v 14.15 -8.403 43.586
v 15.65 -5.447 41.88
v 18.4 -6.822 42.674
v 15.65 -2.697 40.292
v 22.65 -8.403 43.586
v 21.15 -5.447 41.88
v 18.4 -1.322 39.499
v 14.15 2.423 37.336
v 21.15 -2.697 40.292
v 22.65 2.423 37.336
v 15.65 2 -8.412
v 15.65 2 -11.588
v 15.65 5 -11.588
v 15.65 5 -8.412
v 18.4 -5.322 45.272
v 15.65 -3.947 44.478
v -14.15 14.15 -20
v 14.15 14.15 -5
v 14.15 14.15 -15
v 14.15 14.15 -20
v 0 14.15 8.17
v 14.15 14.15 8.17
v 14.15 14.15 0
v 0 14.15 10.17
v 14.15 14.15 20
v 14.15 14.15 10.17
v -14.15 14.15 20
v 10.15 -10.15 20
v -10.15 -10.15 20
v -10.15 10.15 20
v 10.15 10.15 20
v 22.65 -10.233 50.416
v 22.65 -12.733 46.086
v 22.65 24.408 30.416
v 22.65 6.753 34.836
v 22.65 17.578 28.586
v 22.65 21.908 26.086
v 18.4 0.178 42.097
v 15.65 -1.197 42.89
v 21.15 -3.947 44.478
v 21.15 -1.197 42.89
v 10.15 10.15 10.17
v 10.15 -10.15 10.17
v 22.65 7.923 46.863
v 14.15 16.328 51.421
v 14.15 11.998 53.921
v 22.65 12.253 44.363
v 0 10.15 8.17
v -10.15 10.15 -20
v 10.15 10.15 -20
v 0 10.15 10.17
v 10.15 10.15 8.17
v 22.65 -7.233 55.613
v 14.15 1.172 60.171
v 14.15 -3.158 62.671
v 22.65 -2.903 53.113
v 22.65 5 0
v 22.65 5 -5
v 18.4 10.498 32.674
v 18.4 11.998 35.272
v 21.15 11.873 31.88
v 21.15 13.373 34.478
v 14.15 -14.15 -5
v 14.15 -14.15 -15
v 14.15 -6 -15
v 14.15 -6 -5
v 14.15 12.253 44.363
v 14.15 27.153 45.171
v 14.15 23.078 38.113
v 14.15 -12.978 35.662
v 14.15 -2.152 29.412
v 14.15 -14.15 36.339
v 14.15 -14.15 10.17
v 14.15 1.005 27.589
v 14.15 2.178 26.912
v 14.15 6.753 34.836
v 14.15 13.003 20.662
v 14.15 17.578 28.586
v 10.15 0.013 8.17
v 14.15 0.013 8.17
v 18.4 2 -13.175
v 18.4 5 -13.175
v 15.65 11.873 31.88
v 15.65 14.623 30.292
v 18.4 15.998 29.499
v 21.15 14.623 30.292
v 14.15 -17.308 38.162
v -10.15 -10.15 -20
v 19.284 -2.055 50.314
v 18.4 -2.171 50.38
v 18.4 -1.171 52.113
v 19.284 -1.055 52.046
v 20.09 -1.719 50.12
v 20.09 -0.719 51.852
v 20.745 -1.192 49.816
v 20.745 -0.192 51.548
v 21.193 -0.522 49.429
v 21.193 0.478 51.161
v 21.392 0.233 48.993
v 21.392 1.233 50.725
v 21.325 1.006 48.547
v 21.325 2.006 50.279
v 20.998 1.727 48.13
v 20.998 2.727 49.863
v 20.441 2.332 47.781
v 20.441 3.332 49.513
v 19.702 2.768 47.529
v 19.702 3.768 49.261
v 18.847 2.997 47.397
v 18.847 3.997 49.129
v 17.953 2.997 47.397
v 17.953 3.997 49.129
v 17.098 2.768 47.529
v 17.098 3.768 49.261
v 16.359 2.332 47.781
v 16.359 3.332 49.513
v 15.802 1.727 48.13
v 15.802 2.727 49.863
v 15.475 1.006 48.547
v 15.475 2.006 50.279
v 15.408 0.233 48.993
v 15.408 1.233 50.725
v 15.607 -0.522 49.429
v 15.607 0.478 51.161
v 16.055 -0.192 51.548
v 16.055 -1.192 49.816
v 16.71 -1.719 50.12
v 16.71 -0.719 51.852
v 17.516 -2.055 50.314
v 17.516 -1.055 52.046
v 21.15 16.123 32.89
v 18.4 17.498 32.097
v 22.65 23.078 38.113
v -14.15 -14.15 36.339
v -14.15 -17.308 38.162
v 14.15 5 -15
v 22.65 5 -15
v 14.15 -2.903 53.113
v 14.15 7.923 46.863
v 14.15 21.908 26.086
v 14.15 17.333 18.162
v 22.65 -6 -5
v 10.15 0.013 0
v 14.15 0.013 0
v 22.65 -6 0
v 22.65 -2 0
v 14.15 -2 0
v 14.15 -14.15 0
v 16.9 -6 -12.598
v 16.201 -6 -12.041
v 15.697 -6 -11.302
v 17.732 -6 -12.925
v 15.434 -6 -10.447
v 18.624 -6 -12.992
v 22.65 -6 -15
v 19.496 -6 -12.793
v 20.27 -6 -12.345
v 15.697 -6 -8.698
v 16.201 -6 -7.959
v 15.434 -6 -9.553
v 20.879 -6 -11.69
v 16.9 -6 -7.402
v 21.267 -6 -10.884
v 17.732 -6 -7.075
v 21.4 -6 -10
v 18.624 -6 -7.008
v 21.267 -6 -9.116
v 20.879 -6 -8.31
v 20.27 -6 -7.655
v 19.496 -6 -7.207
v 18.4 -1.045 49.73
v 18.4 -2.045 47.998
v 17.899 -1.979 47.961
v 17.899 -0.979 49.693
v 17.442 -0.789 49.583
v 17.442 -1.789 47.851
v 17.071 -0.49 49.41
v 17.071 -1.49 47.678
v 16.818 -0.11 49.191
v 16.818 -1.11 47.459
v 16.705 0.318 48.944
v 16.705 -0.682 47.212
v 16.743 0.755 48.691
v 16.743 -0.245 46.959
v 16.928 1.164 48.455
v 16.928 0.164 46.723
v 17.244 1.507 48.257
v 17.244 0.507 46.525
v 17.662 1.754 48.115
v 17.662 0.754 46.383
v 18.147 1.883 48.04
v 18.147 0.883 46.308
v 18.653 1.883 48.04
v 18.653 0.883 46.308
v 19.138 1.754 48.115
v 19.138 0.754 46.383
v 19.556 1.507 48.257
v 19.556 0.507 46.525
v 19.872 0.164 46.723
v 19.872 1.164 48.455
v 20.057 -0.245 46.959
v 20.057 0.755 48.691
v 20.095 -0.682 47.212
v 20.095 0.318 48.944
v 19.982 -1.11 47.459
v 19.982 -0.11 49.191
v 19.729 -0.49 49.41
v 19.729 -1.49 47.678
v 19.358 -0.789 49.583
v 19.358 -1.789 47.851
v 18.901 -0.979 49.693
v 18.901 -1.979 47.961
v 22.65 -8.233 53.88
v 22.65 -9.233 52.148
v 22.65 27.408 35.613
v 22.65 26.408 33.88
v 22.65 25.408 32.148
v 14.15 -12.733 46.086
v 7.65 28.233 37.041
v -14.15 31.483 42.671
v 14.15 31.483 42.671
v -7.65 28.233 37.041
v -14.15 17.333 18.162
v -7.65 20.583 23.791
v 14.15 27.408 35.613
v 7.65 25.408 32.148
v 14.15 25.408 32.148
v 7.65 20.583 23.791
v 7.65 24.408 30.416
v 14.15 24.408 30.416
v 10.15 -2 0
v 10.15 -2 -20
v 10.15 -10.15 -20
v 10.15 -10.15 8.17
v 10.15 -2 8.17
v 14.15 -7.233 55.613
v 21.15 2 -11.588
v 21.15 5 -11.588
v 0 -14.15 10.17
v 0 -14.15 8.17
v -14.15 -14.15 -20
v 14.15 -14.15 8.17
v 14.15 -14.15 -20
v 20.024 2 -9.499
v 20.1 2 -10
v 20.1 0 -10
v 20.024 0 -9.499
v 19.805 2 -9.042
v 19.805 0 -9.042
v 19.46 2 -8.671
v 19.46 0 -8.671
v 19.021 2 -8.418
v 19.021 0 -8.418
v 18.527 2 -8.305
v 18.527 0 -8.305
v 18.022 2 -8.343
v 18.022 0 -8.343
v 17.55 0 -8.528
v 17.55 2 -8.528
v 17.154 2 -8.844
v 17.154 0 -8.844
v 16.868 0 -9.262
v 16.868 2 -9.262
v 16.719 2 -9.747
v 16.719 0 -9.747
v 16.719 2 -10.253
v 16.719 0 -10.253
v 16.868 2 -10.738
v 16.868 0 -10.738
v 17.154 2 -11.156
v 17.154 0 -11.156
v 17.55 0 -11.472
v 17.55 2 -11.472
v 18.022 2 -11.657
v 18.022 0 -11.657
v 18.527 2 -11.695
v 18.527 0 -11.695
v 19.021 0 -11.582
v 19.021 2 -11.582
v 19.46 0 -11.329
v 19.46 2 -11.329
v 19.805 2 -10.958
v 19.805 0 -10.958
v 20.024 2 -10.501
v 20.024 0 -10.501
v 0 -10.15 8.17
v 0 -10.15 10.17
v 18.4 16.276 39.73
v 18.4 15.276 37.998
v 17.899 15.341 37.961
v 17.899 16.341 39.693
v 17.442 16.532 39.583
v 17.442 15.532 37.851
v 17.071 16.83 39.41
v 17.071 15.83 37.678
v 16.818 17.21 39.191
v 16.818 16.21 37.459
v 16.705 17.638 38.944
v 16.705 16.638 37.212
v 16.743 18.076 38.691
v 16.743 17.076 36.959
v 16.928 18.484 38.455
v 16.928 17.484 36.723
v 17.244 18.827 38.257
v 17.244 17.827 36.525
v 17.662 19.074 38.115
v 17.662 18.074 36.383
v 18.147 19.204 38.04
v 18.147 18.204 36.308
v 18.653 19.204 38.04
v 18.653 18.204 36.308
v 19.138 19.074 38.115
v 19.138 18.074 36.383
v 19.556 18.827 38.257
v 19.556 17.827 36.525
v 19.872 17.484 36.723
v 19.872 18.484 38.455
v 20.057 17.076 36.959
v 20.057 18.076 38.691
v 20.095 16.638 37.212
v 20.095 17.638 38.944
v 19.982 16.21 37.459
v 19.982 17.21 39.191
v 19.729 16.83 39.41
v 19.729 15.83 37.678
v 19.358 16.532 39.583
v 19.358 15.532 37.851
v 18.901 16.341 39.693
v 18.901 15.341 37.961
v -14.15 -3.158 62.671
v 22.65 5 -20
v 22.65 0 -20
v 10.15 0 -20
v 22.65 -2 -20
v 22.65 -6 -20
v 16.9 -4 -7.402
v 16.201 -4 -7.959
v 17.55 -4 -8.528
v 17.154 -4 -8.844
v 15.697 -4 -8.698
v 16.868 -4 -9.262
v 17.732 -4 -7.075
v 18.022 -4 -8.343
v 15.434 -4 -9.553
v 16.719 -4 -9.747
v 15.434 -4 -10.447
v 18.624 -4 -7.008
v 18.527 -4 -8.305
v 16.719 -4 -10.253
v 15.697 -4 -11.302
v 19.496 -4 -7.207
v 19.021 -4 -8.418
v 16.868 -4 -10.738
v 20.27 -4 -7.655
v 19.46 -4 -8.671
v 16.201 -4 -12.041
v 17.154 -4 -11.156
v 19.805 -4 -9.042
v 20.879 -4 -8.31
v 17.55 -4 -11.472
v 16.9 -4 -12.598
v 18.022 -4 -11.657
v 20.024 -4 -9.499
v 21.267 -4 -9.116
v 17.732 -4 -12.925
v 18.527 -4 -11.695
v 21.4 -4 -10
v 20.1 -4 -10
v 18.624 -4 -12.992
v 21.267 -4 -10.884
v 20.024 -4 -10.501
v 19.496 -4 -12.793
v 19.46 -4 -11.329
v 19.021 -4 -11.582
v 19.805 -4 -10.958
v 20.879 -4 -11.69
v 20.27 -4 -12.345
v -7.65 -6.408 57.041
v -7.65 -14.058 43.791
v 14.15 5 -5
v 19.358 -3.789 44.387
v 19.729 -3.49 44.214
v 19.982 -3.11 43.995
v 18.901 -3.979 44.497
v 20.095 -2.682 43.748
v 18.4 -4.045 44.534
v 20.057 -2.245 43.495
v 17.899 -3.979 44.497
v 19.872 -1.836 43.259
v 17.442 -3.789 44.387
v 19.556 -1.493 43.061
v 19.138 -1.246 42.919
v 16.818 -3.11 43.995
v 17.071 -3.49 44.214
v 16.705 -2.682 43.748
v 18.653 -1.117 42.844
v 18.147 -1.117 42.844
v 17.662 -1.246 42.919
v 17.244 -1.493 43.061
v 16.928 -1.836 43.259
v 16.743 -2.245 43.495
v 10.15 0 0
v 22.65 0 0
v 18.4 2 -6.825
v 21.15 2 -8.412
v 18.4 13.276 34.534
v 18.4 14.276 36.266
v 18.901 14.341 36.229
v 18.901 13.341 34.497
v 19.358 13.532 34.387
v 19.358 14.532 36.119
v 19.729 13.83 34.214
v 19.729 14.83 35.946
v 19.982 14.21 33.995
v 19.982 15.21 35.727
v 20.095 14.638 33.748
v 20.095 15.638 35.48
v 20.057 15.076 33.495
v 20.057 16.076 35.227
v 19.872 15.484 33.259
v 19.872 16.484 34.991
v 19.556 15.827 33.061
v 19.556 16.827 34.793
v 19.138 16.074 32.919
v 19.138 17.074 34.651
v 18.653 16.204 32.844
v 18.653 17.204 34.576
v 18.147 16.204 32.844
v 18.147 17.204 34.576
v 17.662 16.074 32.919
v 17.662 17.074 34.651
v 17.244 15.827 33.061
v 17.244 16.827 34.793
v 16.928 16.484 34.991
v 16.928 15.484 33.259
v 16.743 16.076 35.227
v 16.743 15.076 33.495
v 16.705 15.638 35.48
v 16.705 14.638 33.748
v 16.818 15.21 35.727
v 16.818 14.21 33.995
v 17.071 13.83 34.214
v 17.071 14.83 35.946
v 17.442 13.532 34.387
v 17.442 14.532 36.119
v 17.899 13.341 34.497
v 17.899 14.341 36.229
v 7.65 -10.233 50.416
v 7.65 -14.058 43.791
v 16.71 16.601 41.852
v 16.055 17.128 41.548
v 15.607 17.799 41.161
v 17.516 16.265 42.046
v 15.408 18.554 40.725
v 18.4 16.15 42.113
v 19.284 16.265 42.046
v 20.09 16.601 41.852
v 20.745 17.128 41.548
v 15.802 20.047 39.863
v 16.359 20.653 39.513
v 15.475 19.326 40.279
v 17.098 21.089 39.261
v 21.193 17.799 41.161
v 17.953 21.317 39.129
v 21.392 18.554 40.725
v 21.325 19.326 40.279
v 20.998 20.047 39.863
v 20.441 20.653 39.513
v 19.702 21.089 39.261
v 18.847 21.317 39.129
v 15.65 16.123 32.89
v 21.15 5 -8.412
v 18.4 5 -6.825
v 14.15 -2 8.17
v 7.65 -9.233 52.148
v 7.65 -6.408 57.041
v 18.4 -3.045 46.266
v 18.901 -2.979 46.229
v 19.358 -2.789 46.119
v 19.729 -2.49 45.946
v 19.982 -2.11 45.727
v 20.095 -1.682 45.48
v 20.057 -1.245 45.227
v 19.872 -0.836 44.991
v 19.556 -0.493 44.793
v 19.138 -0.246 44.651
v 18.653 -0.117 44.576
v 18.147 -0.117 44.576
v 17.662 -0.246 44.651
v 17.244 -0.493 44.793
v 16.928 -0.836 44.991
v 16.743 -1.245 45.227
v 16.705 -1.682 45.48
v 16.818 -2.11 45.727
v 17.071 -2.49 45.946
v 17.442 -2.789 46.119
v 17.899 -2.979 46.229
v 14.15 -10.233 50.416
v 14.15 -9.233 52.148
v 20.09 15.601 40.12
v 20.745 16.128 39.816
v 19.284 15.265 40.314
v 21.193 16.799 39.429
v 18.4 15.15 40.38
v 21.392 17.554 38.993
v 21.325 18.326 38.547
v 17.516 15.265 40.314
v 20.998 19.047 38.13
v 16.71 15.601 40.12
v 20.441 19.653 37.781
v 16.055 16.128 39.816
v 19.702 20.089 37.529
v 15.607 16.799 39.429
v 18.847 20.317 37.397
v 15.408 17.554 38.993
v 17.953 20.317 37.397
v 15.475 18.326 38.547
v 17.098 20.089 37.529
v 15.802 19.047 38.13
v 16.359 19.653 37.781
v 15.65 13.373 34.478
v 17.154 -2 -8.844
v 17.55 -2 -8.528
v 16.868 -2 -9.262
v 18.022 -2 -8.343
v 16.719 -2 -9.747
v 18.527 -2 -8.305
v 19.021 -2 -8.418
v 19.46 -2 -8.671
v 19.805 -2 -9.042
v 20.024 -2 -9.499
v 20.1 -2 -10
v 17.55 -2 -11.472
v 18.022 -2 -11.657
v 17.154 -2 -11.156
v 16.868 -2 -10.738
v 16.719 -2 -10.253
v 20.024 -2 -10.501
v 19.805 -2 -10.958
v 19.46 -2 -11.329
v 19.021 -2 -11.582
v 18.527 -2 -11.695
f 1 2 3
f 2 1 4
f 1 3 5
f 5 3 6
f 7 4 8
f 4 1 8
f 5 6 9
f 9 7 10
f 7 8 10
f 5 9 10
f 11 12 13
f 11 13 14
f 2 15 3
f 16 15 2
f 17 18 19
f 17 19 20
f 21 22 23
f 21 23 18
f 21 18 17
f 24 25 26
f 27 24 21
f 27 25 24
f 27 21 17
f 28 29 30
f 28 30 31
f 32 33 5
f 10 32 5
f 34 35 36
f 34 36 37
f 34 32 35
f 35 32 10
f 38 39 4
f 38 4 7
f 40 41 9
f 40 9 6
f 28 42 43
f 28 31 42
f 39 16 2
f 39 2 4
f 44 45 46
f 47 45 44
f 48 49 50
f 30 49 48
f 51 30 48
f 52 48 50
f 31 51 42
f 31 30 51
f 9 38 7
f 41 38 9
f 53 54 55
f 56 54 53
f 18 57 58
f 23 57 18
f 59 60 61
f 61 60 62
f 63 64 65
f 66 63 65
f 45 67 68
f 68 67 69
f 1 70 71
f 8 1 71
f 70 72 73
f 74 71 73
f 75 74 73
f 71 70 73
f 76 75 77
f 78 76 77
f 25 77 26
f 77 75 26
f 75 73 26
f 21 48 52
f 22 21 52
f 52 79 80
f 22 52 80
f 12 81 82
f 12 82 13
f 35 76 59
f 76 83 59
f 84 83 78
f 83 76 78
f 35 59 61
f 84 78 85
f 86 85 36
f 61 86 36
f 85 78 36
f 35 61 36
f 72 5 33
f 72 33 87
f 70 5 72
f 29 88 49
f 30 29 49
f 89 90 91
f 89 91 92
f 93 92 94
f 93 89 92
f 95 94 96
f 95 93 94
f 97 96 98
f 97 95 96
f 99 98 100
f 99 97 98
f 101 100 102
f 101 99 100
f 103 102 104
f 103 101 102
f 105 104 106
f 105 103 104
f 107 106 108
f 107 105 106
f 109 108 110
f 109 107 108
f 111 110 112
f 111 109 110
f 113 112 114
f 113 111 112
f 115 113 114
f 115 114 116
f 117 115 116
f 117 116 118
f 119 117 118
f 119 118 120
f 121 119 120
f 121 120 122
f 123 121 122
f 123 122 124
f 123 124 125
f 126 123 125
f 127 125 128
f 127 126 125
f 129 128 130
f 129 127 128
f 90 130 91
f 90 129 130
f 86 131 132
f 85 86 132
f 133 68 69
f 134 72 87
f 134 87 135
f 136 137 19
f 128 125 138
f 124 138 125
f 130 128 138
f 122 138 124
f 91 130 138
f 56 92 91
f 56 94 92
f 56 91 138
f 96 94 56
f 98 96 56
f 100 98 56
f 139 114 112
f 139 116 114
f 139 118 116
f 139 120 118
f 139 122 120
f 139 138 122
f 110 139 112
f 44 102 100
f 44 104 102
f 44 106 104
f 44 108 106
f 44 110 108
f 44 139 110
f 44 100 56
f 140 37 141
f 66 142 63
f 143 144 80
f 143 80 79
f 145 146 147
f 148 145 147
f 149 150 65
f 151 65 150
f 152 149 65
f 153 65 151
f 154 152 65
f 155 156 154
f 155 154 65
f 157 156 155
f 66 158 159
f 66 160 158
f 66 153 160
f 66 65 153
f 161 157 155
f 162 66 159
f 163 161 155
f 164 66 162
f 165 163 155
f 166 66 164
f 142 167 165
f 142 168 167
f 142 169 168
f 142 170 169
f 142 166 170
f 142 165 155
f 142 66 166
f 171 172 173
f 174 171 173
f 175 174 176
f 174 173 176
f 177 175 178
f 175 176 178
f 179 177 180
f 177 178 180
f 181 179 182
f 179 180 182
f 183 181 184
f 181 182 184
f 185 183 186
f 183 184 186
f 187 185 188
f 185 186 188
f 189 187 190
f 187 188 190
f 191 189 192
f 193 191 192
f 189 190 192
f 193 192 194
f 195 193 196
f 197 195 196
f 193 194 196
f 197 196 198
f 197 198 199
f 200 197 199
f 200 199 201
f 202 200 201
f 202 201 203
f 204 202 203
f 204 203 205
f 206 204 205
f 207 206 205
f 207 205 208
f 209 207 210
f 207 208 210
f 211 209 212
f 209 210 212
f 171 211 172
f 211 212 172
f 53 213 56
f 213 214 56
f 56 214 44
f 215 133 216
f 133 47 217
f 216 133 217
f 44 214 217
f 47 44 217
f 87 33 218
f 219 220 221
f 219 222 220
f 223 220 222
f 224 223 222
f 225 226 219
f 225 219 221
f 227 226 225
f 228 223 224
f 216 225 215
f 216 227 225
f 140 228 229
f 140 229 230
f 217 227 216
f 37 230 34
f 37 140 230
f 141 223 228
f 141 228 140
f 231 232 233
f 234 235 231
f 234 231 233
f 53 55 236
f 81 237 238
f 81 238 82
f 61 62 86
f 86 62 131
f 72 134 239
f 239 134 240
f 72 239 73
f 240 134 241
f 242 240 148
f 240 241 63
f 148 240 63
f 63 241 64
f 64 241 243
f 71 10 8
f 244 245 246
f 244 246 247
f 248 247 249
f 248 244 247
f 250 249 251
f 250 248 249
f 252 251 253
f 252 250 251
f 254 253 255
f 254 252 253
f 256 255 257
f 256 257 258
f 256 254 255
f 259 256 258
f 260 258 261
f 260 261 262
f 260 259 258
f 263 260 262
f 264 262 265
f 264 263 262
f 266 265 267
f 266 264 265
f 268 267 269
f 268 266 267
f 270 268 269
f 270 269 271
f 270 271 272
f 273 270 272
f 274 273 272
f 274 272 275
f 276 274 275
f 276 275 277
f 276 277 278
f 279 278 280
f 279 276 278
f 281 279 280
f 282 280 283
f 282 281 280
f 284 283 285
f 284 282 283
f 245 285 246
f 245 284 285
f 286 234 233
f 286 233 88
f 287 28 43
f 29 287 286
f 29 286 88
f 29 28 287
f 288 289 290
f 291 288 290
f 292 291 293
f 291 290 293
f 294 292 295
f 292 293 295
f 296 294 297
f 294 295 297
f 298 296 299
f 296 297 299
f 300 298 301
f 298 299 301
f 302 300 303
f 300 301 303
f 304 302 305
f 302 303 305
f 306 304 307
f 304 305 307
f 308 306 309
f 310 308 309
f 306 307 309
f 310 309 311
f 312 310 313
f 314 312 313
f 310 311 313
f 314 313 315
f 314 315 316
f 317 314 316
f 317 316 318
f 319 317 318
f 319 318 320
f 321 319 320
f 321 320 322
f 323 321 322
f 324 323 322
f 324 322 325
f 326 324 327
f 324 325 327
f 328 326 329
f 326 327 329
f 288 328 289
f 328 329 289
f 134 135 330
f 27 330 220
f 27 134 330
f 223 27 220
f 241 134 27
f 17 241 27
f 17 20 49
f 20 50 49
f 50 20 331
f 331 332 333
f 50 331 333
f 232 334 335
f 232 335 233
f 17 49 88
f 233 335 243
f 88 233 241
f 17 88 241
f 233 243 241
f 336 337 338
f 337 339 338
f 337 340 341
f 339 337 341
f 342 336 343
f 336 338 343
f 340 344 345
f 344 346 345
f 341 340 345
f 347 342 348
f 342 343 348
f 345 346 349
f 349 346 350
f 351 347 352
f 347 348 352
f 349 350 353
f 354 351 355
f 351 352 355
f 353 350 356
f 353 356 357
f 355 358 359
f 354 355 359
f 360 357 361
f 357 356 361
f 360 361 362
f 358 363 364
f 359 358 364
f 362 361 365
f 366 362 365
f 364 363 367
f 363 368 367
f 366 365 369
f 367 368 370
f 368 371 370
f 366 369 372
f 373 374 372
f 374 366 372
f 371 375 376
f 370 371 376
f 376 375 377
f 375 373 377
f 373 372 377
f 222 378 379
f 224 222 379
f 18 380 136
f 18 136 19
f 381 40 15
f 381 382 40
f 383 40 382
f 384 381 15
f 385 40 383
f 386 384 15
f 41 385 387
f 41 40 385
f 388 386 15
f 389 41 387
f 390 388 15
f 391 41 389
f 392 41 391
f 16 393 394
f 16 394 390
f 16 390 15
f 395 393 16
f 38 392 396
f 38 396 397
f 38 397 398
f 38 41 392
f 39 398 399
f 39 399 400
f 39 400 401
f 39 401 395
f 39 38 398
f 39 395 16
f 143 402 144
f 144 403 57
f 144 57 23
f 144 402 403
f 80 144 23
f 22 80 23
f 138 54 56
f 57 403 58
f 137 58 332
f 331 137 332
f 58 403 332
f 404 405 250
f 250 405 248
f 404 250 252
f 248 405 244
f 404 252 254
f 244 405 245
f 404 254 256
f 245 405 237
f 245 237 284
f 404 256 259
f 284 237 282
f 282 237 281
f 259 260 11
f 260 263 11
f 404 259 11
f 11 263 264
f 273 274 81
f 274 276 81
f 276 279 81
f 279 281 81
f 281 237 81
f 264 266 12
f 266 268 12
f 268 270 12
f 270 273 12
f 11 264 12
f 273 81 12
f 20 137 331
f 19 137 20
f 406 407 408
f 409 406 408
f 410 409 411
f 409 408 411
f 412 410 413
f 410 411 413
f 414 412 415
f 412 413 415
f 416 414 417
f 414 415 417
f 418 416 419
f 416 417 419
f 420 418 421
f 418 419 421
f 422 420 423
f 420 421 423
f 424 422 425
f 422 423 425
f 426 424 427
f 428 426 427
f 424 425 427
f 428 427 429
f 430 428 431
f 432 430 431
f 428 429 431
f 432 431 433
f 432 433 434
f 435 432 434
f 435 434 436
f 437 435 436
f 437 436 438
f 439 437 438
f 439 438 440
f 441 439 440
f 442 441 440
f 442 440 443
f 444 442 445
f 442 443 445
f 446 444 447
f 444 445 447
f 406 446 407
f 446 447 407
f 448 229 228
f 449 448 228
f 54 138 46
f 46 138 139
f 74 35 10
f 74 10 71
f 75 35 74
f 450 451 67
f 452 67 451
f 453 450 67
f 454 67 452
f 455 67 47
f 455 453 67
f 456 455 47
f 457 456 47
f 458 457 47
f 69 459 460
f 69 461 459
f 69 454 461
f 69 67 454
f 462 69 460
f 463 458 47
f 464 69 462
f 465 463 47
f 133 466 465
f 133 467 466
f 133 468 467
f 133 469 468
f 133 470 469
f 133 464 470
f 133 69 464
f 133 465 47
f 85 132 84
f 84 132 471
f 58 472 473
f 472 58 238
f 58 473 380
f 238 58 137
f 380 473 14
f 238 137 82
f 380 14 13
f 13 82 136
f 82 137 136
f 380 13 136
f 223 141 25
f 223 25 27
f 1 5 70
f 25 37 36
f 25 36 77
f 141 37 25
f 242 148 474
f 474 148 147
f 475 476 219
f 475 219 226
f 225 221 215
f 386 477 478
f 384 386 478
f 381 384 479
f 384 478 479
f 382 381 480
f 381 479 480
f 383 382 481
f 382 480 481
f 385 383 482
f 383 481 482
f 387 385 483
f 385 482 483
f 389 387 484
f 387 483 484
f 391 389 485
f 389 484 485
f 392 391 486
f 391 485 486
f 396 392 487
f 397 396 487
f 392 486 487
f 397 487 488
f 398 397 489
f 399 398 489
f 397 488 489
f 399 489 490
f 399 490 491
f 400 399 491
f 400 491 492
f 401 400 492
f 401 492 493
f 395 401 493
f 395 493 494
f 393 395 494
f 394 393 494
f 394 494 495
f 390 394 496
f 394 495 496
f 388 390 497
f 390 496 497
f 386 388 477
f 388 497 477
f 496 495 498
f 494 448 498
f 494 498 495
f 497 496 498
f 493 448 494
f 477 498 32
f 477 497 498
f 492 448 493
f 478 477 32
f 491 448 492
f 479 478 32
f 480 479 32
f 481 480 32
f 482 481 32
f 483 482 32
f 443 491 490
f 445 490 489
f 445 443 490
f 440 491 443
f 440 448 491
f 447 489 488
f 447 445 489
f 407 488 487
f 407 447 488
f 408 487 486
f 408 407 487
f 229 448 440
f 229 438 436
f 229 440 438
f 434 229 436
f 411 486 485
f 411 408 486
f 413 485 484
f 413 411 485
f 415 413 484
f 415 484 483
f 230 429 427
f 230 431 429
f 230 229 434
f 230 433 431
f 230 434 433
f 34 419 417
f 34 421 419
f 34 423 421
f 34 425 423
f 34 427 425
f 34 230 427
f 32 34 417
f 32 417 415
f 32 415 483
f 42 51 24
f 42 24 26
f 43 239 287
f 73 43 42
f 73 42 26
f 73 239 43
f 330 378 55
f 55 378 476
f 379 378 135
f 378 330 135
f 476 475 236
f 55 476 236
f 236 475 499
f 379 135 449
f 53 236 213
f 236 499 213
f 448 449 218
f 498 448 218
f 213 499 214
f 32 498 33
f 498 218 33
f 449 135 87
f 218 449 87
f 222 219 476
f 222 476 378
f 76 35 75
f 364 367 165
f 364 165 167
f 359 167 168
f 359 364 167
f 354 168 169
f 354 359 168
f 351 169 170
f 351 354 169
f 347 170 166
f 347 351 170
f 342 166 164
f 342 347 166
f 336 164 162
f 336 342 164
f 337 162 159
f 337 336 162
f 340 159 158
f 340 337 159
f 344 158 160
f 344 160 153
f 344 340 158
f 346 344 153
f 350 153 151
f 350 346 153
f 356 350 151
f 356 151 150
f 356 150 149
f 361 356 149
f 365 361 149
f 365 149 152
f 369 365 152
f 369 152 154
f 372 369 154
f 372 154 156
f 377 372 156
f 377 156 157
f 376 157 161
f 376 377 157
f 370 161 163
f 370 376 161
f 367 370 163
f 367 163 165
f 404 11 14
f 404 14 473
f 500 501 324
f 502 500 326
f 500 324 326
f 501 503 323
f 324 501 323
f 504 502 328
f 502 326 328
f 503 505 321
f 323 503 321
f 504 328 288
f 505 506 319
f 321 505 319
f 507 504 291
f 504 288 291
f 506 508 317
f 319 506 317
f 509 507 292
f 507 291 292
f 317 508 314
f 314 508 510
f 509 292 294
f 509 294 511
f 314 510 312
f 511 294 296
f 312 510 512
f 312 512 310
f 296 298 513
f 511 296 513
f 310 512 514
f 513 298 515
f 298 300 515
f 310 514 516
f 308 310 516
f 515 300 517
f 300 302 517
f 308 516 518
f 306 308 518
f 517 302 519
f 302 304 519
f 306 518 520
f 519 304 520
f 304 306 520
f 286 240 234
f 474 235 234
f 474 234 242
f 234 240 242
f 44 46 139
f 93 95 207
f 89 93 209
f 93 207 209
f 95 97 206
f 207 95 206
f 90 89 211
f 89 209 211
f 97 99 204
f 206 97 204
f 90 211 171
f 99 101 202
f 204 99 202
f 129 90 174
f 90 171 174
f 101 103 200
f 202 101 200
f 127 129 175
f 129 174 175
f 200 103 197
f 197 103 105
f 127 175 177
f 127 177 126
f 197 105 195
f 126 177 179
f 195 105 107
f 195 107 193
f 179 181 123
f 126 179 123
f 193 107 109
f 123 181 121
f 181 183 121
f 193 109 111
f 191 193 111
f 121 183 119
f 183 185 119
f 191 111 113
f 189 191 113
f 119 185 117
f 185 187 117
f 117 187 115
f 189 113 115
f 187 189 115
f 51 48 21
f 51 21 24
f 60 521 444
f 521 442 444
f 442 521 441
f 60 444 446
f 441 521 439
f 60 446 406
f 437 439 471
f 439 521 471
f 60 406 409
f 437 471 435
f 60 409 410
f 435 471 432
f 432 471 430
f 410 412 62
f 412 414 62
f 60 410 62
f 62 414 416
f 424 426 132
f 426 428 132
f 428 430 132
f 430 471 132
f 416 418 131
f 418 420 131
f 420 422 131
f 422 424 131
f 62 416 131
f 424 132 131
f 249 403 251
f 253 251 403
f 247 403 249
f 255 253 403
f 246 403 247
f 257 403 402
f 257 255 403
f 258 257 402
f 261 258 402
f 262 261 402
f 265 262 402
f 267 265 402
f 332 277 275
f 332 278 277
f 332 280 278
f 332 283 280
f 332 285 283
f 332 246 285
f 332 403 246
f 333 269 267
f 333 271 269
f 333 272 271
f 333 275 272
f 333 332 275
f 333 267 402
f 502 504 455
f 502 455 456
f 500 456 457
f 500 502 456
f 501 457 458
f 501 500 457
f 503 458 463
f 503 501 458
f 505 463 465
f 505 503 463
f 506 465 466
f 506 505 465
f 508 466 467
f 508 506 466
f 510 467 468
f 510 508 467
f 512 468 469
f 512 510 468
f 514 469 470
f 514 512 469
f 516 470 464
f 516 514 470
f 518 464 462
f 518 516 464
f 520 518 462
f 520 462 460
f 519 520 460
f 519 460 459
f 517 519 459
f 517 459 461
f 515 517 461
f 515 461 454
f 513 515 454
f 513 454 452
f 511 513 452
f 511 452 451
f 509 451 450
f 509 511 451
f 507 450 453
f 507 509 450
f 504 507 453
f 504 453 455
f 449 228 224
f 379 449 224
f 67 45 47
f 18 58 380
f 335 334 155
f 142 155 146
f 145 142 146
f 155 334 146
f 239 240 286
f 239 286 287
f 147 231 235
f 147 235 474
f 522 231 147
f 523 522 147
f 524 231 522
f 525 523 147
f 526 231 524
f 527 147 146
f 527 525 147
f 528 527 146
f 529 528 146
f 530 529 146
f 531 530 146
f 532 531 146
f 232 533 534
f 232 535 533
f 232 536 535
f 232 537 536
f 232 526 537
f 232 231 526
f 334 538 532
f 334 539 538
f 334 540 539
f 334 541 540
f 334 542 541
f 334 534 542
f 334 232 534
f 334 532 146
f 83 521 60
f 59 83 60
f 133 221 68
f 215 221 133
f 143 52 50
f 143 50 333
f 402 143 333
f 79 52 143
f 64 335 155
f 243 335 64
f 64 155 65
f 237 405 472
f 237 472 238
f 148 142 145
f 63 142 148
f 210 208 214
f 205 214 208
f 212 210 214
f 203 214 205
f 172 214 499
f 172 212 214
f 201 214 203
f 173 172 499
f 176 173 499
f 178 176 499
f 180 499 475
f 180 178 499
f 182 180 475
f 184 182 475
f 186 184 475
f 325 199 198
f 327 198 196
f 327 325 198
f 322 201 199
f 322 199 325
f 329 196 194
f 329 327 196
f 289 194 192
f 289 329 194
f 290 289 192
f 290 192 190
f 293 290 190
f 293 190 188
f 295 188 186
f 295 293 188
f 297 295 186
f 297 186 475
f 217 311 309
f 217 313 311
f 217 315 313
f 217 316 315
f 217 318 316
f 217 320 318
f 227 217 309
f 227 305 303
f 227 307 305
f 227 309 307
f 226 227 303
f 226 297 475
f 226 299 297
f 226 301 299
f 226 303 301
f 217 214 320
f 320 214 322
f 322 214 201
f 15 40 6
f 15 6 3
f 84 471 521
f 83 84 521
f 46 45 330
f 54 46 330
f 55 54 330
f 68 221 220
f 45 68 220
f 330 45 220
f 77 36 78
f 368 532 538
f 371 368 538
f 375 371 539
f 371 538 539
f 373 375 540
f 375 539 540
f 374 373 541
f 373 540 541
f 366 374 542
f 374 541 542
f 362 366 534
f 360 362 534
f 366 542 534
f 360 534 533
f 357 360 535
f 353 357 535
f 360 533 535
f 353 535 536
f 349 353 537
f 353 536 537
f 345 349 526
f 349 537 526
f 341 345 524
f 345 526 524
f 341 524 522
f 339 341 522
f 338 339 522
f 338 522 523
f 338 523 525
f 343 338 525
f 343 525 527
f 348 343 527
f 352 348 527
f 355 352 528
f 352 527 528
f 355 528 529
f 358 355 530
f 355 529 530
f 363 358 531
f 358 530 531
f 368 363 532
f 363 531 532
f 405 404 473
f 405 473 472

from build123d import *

# Parameters (mm, degrees)
ESQUISSE1_W                = 28.3
ESQUISSE1_H                = 28.3
ESQUISSE1_W_2              = 20.3
ESQUISSE1_H_2              = 20.3
ESQUISSE1_W_3              = 4
ESQUISSE1_H_3              = 2
BOSS_EXTRU_1_DEPTH         = 20
BOSS_EXTRU_7_DEPTH         = 20
ESQUISSE2_W                = 8.5
ESQUISSE2_H                = 20
ESQUISSE2_R                = 1.7
BOSS_EXTRU_2_DEPTH         = 2
ESQUISSE2_3_W              = 8.5
ESQUISSE2_3_H              = 20
BOSS_EXTRU_3_DEPTH         = 3
ESQUISSE3_W                = 8.5
ESQUISSE3_H                = 20
ESQUISSE3_R                = 1.7
BOSS_EXTRU_4_DEPTH         = 2
ESQUISSE5_W                = 8.5
ESQUISSE5_H                = 20
ESQUISSE5_R                = 3
BOSS_EXTRU_5_DEPTH         = 2
BOSS_EXTRU_6_DEPTH         = 20
BOSS_EXTRU_6_DEPTH_BACK    = 20
ESQUISSE6_W                = 28.3
ESQUISSE6_H                = 28.3
ESQUISSE6_W_2              = 15.3
ESQUISSE6_H_2              = 15.3
BOSS_EXTRU_12_REACH        = 59.663
ESQUISSE20_W               = 28.3
ESQUISSE20_H               = 28.3
ENL_V_MAT_EXTRU_1_REACH    = 81.469
ESQUISSE7_W                = 6.5
ESQUISSE7_H                = 2
ENL_V_MAT_EXTRU_2_REACH    = 82.765
ESQUISSE8_W                = 14.15
ESQUISSE8_H                = 2
ESQUISSE9_W                = 8.5
ESQUISSE9_H                = 40
BOSS_EXTRU_8_DEPTH         = 5
ESQUISSE9_4_R              = 1.7
BOSS_EXTRU_9_DEPTH         = 2
ESQUISSE10_W               = 8.5
ESQUISSE10_H               = 40
ESQUISSE10_R               = 1.7
BOSS_EXTRU_10_DEPTH        = 2
ESQUISSE11_W               = 8.5
ESQUISSE11_H               = 40
ESQUISSE11_R               = 3
BOSS_EXTRU_11_DEPTH        = 2
NERVURE4_REACH             = 81.469
ESQUISSE14_WALL_W          = 172.71321229
ESQUISSE14_WALL_H          = 5
NERVURE10_REACH            = 81.469
ESQUISSE16_WALL_W          = 173.426178518
ESQUISSE16_WALL_H          = 5
R_P_TITION_LIN_AIRE1_COUNT = 3
R_P_TITION_LIN_AIRE1_PITCH = 17.5
NERVURE11_REACH            = 93.316
ESQUISSE17_WALL_W          = 197.121376998
ESQUISSE17_WALL_H          = 5
NERVURE17_REACH            = 75.701
ESQUISSE19_WALL_W          = 161.177827304
ESQUISSE19_WALL_H          = 5
R_P_TITION_LIN_AIRE2_COUNT = 2
R_P_TITION_LIN_AIRE2_PITCH = 15
R_P_TITION_LIN_AIRE3_COUNT = 2
R_P_TITION_LIN_AIRE3_PITCH = 15
ENL_V_MAT_EXTRU_3_REACH    = 75.701
ESQUISSE21_W               = 4
ESQUISSE21_H               = 2.012776607


with BuildPart() as part:
    # Esquisse1 → Boss.-Extru.1 (new body)
    # profile 1 of 2: a face of its own
    with BuildSketch(Plane.XY):
        Rectangle(ESQUISSE1_W, ESQUISSE1_H)
        Rectangle(ESQUISSE1_W_2, ESQUISSE1_H_2, mode=Mode.SUBTRACT)
    # profile 2 of 2: a face of its own
    with BuildSketch(Plane.XY):
        with Locations((12.15, -1)):
            Rectangle(ESQUISSE1_W_3, ESQUISSE1_H_3)
    extrude(amount=BOSS_EXTRU_1_DEPTH)

    # Esquisse1<3> → Boss.-Extru.7 (add)
    with BuildSketch(Plane.XY):
        Polygon((14.15, 14.15), (-14.15, 14.15), (-14.15, -14.15), (14.15, -14.15), (14.15, -2), (10.15, -2), (10.15, -10.15), (-10.15, -10.15), (-10.15, 10.15), (10.15, 10.15), (10.15, 0), (14.15, 0), align=None)
    extrude(amount=-BOSS_EXTRU_7_DEPTH)

    # Esquisse2 → Boss.-Extru.2 (add)
    with BuildSketch(Plane(origin=(0, 2, 0), x_dir=(-1, 0, 0), z_dir=(0, -1, 0))):
        with Locations((-18.4, 10)):
            Rectangle(ESQUISSE2_W, ESQUISSE2_H)
        with Locations(Location((-18.4, 10, 0), (0, 0, 180))):
            Circle(ESQUISSE2_R, mode=Mode.SUBTRACT)
    extrude(amount=BOSS_EXTRU_2_DEPTH)

    # Esquisse2<3> → Boss.-Extru.3 (add)
    with BuildSketch(Plane(origin=(0, 2, 0), x_dir=(-1, 0, 0), z_dir=(0, -1, 0))):
        with Locations((-18.4, 10)):
            Rectangle(ESQUISSE2_3_W, ESQUISSE2_3_H)
        Polygon((-15.65, 11.58771324), (-15.65, 8.41228676), (-18.4, 6.824573519), (-21.15, 8.41228676), (-21.15, 11.58771324), (-18.4, 13.175426481), align=None, mode=Mode.SUBTRACT)
    extrude(amount=-BOSS_EXTRU_3_DEPTH)

    # Esquisse3 → Boss.-Extru.4 (add)
    with BuildSketch(Plane(origin=(0, -2, 0), x_dir=(1, 0, 0), z_dir=(0, 1, 0))):
        with Locations((18.4, 10)):
            Rectangle(ESQUISSE3_W, ESQUISSE3_H)
        with Locations((18.4, 10)):
            Circle(ESQUISSE3_R, mode=Mode.SUBTRACT)
    extrude(amount=-BOSS_EXTRU_4_DEPTH)

    # Esquisse5 → Boss.-Extru.5 (add)
    with BuildSketch(Plane.XZ.offset(4)):
        with Locations((18.4, -10)):
            Rectangle(ESQUISSE5_W, ESQUISSE5_H)
        with Locations((18.4, -10)):
            Circle(ESQUISSE5_R, mode=Mode.SUBTRACT)
    extrude(amount=BOSS_EXTRU_5_DEPTH)


with BuildPart() as body_2:
    # Esquisse6 → Boss.-Extru.6 (new, two sides: drawn at the far end of the back side and taken through both)
    with BuildSketch(Plane(origin=(0, -11.88296393, 7.558102729), x_dir=(-1, 0, 0), z_dir=(0, -0.8660254037844382, 0.5000000000000011)).offset(-BOSS_EXTRU_6_DEPTH_BACK)):
        with Locations((0, -37.941481073)):
            Rectangle(ESQUISSE6_W, ESQUISSE6_H)
        with Locations((0, -37.941481073)):
            Rectangle(ESQUISSE6_W_2, ESQUISSE6_H_2, mode=Mode.SUBTRACT)
    extrude(amount=BOSS_EXTRU_6_DEPTH + BOSS_EXTRU_6_DEPTH_BACK)

    # Esquisse20 → Boss.-Extru.12 (add, up to next)
    with BuildSketch(Plane.XY.offset(20), mode=Mode.PRIVATE) as boss_extru_12_sk1:
        Rectangle(ESQUISSE20_W, ESQUISSE20_H)
    boss_extru_12_tool1 = extrude(boss_extru_12_sk1.sketch, amount=BOSS_EXTRU_12_REACH, mode=Mode.PRIVATE) - body_2.part

    add(part.part)  # Boss.-Extru.12 merges part
    add(boss_extru_12_tool1.solids().sort_by_distance((0, 0, 20))[0])

    # Esquisse7 → Enlèv. mat.-Extru.1 (cut, up to next)
    with BuildSketch(Plane(origin=(0, -29.505485507, 17.035), x_dir=(1, 0, 0), z_dir=(0, -0.866025403784438, 0.5000000000000011)), mode=Mode.PRIVATE) as enl_v_mat_extru_1_sk1:
        with Locations((10.9, 39.545508076)):
            Rectangle(ESQUISSE7_W, ESQUISSE7_H)
    enl_v_mat_extru_1_tool1 = extrude(enl_v_mat_extru_1_sk1.sketch, amount=-ENL_V_MAT_EXTRU_1_REACH, mode=Mode.PRIVATE) & body_2.part
    add(enl_v_mat_extru_1_tool1.solids().sort_by_distance((10.9, -9.732731, 51.282415))[0], mode=Mode.SUBTRACT)

    # Esquisse8 → Enlèv. mat.-Extru.2 (cut, up to next)
    with BuildSketch(Plane.XZ.offset(14.15), mode=Mode.PRIVATE) as enl_v_mat_extru_2_sk1:
        with Locations((7.075, 9.169506309)):
            Rectangle(ESQUISSE8_W, ESQUISSE8_H)
    enl_v_mat_extru_2_tool1 = extrude(enl_v_mat_extru_2_sk1.sketch, amount=-ENL_V_MAT_EXTRU_2_REACH, mode=Mode.PRIVATE) & body_2.part
    add(enl_v_mat_extru_2_tool1.solids().sort_by_distance((7.075, -14.15, 9.169506))[0], mode=Mode.SUBTRACT)

    # Esquisse9 → Boss.-Extru.8 (add)
    with BuildSketch(Plane(origin=(0, 19.272754038, 33.381389195), x_dir=(1, 0, 0), z_dir=(0, 0.5000000000000011, 0.866025403784438))):
        with Locations((18.4, -14.07)):
            Rectangle(ESQUISSE9_W, ESQUISSE9_H)
        Polygon((18.4, -7.245426481), (21.15, -5.65771324), (21.15, -2.48228676), (18.4, -0.894573519), (15.65, -2.48228676), (15.65, -5.65771324), align=None, mode=Mode.SUBTRACT)
        Polygon((18.4, -20.894573519), (21.15, -22.48228676), (21.15, -25.65771324), (18.4, -27.245426481), (15.65, -25.65771324), (15.65, -22.48228676), align=None, mode=Mode.SUBTRACT)
    extrude(amount=-BOSS_EXTRU_8_DEPTH)

    # Esquisse9<4> → Boss.-Extru.9 (add)
    # profile 1 of 2: a face of its own
    with BuildSketch(Plane(origin=(0, 19.272754038, 33.381389195), x_dir=(1, 0, 0), z_dir=(0, 0.5000000000000011, 0.866025403784438))):
        Polygon((15.65, -5.65771324), (18.4, -7.245426481), (21.15, -5.65771324), (21.15, -2.48228676), (18.4, -0.894573519), (15.65, -2.48228676), align=None)
        with Locations(Location((18.4, -4.07, 0), (0, 0, 270))):
            Circle(ESQUISSE9_4_R, mode=Mode.SUBTRACT)
    # profile 2 of 2: a face of its own
    with BuildSketch(Plane(origin=(0, 19.272754038, 33.381389195), x_dir=(1, 0, 0), z_dir=(0, 0.5000000000000011, 0.866025403784438))):
        Polygon((21.15, -22.48228676), (21.15, -25.65771324), (18.4, -27.245426481), (15.65, -25.65771324), (15.65, -22.48228676), (18.4, -20.894573519), align=None)
        with Locations(Location((18.4, -24.07, 0), (0, 0, 270))):
            Circle(ESQUISSE9_4_R, mode=Mode.SUBTRACT)
    extrude(amount=-BOSS_EXTRU_9_DEPTH)

    # Esquisse10 → Boss.-Extru.10 (add)
    with BuildSketch(Plane(origin=(0, 20.272754038, 35.113440003), x_dir=(-1, 0, 0), z_dir=(0, -0.5000000000000011, -0.866025403784438))):
        with Locations((-18.4, -14.07)):
            Rectangle(ESQUISSE10_W, ESQUISSE10_H)
        with Locations(Location((-18.4, -24.07, 0), (0, 0, 270))):
            Circle(ESQUISSE10_R, mode=Mode.SUBTRACT)
        with Locations(Location((-18.4, -4.07, 0), (0, 0, 270))):
            Circle(ESQUISSE10_R, mode=Mode.SUBTRACT)
    extrude(amount=-BOSS_EXTRU_10_DEPTH)

    # Esquisse11 → Boss.-Extru.11 (add)
    with BuildSketch(Plane(origin=(0, 21.272754038, 36.84549081), x_dir=(1, 0, 0), z_dir=(0, 0.5000000000000011, 0.866025403784438))):
        with Locations((18.4, -14.07)):
            Rectangle(ESQUISSE11_W, ESQUISSE11_H)
        with Locations(Location((18.4, -4.07, 0), (0, 0, 270))):
            Circle(ESQUISSE11_R, mode=Mode.SUBTRACT)
        with Locations(Location((18.4, -24.07, 0), (0, 0, 270))):
            Circle(ESQUISSE11_R, mode=Mode.SUBTRACT)
    extrude(amount=BOSS_EXTRU_11_DEPTH)

    # Esquisse14 wall → Nervure4 (add, up to next)
    with BuildSketch(Plane(origin=(18.4, -5.195231469, 59.141595139), x_dir=(0.721811427089, -0.346044890046, -0.599367331272), z_dir=(0.692089780103, 0.360905713545, 0.625107032601)), mode=Mode.PRIVATE) as nervure4_sk1:
        with Locations((0, 2.5)):
            Rectangle(ESQUISSE14_WALL_W, ESQUISSE14_WALL_H)
    nervure4_tool1 = extrude(nervure4_sk1.sketch, amount=-NERVURE4_REACH, mode=Mode.PRIVATE) - body_2.part
    nervure4 = nervure4_tool1.solids().sort_by_distance((18.4, -5.195231469, 59.141595139))[0]
    add(nervure4)

    # Esquisse16 wall → Nervure10 (add, up to next)
    with BuildSketch(Plane(origin=(18.4, -15.020231469, 42.124195954), x_dir=(-0.680604645529, -0.366325441564, -0.634494276844), z_dir=(0.732650883085, -0.340302322764, -0.589420912962)), mode=Mode.PRIVATE) as nervure10_sk1:
        with Locations((0, 2.5)):
            Rectangle(ESQUISSE16_WALL_W, ESQUISSE16_WALL_H)
    nervure10_tool1 = extrude(nervure10_sk1.sketch, amount=-NERVURE10_REACH, mode=Mode.PRIVATE) - body_2.part
    nervure10 = nervure10_tool1.solids().sort_by_distance((18.4, -15.020231469, 42.124195954))[0]
    add(nervure10)

    # Répétition linéaire1: Nervure4, Nervure10 ×3
    with Locations(*[Vector(0, 0.8660254037844382, -0.500000000000001) * (i * R_P_TITION_LIN_AIRE1_PITCH) for i in range(1, R_P_TITION_LIN_AIRE1_COUNT)]):
        add(nervure4)
        add(nervure10)

    # Esquisse17 wall → Nervure11 (add, up to next)
    with BuildSketch(Plane(origin=(18.4, 9.575, -20), x_dir=(-0.680604645507, 0.732650883105, 0), z_dir=(0.732650883105, 0.680604645507, 0)), mode=Mode.PRIVATE) as nervure11_sk1:
        with Locations((0, 2.5)):
            Rectangle(ESQUISSE17_WALL_W, ESQUISSE17_WALL_H)
    nervure11_tool1 = extrude(nervure11_sk1.sketch, amount=-NERVURE11_REACH, mode=Mode.PRIVATE) - body_2.part
    nervure11 = nervure11_tool1.solids().sort_by_distance((18.4, 9.575, -20))[0]
    add(nervure11)

    # Esquisse19 wall → Nervure17 (add, up to next)
    with BuildSketch(Plane(origin=(18.4, -10.075, 0), x_dir=(-0.721811427095, -0.692089780097, 0), z_dir=(0.692089780097, -0.721811427095, 0)), mode=Mode.PRIVATE) as nervure17_sk1:
        with Locations((0, 2.5)):
            Rectangle(ESQUISSE19_WALL_W, ESQUISSE19_WALL_H)
    nervure17_tool1 = extrude(nervure17_sk1.sketch, amount=-NERVURE17_REACH, mode=Mode.PRIVATE) - body_2.part
    nervure17 = nervure17_tool1.solids().sort_by_distance((18.4, -10.075, 0))[0]
    add(nervure17)

    # Répétition linéaire2: Nervure17 ×2
    with Locations(*[(0, 0, -i * R_P_TITION_LIN_AIRE2_PITCH) for i in range(1, R_P_TITION_LIN_AIRE2_COUNT)]):
        add(nervure17)

    # Répétition linéaire3: Nervure11 ×2
    with Locations(*[(0, 0, i * R_P_TITION_LIN_AIRE3_PITCH) for i in range(1, R_P_TITION_LIN_AIRE3_COUNT)]):
        add(nervure11)

    # Esquisse21 → Enlèv. mat.-Extru.3 (cut, up to next)
    with BuildSketch(Plane(origin=(0, 0, 0), x_dir=(-1, 0, 0), z_dir=(0, 0, -1)), mode=Mode.PRIVATE) as enl_v_mat_extru_3_sk1:
        with Locations((-12.15, -0.993611697)):
            Rectangle(ESQUISSE21_W, ESQUISSE21_H)
    enl_v_mat_extru_3_tool1 = extrude(enl_v_mat_extru_3_sk1.sketch, amount=-ENL_V_MAT_EXTRU_3_REACH, mode=Mode.PRIVATE) & body_2.part
    add(enl_v_mat_extru_3_tool1.solids().sort_by_distance((12.15, -0.993612, 0))[0], mode=Mode.SUBTRACT)


solid = body_2.part
